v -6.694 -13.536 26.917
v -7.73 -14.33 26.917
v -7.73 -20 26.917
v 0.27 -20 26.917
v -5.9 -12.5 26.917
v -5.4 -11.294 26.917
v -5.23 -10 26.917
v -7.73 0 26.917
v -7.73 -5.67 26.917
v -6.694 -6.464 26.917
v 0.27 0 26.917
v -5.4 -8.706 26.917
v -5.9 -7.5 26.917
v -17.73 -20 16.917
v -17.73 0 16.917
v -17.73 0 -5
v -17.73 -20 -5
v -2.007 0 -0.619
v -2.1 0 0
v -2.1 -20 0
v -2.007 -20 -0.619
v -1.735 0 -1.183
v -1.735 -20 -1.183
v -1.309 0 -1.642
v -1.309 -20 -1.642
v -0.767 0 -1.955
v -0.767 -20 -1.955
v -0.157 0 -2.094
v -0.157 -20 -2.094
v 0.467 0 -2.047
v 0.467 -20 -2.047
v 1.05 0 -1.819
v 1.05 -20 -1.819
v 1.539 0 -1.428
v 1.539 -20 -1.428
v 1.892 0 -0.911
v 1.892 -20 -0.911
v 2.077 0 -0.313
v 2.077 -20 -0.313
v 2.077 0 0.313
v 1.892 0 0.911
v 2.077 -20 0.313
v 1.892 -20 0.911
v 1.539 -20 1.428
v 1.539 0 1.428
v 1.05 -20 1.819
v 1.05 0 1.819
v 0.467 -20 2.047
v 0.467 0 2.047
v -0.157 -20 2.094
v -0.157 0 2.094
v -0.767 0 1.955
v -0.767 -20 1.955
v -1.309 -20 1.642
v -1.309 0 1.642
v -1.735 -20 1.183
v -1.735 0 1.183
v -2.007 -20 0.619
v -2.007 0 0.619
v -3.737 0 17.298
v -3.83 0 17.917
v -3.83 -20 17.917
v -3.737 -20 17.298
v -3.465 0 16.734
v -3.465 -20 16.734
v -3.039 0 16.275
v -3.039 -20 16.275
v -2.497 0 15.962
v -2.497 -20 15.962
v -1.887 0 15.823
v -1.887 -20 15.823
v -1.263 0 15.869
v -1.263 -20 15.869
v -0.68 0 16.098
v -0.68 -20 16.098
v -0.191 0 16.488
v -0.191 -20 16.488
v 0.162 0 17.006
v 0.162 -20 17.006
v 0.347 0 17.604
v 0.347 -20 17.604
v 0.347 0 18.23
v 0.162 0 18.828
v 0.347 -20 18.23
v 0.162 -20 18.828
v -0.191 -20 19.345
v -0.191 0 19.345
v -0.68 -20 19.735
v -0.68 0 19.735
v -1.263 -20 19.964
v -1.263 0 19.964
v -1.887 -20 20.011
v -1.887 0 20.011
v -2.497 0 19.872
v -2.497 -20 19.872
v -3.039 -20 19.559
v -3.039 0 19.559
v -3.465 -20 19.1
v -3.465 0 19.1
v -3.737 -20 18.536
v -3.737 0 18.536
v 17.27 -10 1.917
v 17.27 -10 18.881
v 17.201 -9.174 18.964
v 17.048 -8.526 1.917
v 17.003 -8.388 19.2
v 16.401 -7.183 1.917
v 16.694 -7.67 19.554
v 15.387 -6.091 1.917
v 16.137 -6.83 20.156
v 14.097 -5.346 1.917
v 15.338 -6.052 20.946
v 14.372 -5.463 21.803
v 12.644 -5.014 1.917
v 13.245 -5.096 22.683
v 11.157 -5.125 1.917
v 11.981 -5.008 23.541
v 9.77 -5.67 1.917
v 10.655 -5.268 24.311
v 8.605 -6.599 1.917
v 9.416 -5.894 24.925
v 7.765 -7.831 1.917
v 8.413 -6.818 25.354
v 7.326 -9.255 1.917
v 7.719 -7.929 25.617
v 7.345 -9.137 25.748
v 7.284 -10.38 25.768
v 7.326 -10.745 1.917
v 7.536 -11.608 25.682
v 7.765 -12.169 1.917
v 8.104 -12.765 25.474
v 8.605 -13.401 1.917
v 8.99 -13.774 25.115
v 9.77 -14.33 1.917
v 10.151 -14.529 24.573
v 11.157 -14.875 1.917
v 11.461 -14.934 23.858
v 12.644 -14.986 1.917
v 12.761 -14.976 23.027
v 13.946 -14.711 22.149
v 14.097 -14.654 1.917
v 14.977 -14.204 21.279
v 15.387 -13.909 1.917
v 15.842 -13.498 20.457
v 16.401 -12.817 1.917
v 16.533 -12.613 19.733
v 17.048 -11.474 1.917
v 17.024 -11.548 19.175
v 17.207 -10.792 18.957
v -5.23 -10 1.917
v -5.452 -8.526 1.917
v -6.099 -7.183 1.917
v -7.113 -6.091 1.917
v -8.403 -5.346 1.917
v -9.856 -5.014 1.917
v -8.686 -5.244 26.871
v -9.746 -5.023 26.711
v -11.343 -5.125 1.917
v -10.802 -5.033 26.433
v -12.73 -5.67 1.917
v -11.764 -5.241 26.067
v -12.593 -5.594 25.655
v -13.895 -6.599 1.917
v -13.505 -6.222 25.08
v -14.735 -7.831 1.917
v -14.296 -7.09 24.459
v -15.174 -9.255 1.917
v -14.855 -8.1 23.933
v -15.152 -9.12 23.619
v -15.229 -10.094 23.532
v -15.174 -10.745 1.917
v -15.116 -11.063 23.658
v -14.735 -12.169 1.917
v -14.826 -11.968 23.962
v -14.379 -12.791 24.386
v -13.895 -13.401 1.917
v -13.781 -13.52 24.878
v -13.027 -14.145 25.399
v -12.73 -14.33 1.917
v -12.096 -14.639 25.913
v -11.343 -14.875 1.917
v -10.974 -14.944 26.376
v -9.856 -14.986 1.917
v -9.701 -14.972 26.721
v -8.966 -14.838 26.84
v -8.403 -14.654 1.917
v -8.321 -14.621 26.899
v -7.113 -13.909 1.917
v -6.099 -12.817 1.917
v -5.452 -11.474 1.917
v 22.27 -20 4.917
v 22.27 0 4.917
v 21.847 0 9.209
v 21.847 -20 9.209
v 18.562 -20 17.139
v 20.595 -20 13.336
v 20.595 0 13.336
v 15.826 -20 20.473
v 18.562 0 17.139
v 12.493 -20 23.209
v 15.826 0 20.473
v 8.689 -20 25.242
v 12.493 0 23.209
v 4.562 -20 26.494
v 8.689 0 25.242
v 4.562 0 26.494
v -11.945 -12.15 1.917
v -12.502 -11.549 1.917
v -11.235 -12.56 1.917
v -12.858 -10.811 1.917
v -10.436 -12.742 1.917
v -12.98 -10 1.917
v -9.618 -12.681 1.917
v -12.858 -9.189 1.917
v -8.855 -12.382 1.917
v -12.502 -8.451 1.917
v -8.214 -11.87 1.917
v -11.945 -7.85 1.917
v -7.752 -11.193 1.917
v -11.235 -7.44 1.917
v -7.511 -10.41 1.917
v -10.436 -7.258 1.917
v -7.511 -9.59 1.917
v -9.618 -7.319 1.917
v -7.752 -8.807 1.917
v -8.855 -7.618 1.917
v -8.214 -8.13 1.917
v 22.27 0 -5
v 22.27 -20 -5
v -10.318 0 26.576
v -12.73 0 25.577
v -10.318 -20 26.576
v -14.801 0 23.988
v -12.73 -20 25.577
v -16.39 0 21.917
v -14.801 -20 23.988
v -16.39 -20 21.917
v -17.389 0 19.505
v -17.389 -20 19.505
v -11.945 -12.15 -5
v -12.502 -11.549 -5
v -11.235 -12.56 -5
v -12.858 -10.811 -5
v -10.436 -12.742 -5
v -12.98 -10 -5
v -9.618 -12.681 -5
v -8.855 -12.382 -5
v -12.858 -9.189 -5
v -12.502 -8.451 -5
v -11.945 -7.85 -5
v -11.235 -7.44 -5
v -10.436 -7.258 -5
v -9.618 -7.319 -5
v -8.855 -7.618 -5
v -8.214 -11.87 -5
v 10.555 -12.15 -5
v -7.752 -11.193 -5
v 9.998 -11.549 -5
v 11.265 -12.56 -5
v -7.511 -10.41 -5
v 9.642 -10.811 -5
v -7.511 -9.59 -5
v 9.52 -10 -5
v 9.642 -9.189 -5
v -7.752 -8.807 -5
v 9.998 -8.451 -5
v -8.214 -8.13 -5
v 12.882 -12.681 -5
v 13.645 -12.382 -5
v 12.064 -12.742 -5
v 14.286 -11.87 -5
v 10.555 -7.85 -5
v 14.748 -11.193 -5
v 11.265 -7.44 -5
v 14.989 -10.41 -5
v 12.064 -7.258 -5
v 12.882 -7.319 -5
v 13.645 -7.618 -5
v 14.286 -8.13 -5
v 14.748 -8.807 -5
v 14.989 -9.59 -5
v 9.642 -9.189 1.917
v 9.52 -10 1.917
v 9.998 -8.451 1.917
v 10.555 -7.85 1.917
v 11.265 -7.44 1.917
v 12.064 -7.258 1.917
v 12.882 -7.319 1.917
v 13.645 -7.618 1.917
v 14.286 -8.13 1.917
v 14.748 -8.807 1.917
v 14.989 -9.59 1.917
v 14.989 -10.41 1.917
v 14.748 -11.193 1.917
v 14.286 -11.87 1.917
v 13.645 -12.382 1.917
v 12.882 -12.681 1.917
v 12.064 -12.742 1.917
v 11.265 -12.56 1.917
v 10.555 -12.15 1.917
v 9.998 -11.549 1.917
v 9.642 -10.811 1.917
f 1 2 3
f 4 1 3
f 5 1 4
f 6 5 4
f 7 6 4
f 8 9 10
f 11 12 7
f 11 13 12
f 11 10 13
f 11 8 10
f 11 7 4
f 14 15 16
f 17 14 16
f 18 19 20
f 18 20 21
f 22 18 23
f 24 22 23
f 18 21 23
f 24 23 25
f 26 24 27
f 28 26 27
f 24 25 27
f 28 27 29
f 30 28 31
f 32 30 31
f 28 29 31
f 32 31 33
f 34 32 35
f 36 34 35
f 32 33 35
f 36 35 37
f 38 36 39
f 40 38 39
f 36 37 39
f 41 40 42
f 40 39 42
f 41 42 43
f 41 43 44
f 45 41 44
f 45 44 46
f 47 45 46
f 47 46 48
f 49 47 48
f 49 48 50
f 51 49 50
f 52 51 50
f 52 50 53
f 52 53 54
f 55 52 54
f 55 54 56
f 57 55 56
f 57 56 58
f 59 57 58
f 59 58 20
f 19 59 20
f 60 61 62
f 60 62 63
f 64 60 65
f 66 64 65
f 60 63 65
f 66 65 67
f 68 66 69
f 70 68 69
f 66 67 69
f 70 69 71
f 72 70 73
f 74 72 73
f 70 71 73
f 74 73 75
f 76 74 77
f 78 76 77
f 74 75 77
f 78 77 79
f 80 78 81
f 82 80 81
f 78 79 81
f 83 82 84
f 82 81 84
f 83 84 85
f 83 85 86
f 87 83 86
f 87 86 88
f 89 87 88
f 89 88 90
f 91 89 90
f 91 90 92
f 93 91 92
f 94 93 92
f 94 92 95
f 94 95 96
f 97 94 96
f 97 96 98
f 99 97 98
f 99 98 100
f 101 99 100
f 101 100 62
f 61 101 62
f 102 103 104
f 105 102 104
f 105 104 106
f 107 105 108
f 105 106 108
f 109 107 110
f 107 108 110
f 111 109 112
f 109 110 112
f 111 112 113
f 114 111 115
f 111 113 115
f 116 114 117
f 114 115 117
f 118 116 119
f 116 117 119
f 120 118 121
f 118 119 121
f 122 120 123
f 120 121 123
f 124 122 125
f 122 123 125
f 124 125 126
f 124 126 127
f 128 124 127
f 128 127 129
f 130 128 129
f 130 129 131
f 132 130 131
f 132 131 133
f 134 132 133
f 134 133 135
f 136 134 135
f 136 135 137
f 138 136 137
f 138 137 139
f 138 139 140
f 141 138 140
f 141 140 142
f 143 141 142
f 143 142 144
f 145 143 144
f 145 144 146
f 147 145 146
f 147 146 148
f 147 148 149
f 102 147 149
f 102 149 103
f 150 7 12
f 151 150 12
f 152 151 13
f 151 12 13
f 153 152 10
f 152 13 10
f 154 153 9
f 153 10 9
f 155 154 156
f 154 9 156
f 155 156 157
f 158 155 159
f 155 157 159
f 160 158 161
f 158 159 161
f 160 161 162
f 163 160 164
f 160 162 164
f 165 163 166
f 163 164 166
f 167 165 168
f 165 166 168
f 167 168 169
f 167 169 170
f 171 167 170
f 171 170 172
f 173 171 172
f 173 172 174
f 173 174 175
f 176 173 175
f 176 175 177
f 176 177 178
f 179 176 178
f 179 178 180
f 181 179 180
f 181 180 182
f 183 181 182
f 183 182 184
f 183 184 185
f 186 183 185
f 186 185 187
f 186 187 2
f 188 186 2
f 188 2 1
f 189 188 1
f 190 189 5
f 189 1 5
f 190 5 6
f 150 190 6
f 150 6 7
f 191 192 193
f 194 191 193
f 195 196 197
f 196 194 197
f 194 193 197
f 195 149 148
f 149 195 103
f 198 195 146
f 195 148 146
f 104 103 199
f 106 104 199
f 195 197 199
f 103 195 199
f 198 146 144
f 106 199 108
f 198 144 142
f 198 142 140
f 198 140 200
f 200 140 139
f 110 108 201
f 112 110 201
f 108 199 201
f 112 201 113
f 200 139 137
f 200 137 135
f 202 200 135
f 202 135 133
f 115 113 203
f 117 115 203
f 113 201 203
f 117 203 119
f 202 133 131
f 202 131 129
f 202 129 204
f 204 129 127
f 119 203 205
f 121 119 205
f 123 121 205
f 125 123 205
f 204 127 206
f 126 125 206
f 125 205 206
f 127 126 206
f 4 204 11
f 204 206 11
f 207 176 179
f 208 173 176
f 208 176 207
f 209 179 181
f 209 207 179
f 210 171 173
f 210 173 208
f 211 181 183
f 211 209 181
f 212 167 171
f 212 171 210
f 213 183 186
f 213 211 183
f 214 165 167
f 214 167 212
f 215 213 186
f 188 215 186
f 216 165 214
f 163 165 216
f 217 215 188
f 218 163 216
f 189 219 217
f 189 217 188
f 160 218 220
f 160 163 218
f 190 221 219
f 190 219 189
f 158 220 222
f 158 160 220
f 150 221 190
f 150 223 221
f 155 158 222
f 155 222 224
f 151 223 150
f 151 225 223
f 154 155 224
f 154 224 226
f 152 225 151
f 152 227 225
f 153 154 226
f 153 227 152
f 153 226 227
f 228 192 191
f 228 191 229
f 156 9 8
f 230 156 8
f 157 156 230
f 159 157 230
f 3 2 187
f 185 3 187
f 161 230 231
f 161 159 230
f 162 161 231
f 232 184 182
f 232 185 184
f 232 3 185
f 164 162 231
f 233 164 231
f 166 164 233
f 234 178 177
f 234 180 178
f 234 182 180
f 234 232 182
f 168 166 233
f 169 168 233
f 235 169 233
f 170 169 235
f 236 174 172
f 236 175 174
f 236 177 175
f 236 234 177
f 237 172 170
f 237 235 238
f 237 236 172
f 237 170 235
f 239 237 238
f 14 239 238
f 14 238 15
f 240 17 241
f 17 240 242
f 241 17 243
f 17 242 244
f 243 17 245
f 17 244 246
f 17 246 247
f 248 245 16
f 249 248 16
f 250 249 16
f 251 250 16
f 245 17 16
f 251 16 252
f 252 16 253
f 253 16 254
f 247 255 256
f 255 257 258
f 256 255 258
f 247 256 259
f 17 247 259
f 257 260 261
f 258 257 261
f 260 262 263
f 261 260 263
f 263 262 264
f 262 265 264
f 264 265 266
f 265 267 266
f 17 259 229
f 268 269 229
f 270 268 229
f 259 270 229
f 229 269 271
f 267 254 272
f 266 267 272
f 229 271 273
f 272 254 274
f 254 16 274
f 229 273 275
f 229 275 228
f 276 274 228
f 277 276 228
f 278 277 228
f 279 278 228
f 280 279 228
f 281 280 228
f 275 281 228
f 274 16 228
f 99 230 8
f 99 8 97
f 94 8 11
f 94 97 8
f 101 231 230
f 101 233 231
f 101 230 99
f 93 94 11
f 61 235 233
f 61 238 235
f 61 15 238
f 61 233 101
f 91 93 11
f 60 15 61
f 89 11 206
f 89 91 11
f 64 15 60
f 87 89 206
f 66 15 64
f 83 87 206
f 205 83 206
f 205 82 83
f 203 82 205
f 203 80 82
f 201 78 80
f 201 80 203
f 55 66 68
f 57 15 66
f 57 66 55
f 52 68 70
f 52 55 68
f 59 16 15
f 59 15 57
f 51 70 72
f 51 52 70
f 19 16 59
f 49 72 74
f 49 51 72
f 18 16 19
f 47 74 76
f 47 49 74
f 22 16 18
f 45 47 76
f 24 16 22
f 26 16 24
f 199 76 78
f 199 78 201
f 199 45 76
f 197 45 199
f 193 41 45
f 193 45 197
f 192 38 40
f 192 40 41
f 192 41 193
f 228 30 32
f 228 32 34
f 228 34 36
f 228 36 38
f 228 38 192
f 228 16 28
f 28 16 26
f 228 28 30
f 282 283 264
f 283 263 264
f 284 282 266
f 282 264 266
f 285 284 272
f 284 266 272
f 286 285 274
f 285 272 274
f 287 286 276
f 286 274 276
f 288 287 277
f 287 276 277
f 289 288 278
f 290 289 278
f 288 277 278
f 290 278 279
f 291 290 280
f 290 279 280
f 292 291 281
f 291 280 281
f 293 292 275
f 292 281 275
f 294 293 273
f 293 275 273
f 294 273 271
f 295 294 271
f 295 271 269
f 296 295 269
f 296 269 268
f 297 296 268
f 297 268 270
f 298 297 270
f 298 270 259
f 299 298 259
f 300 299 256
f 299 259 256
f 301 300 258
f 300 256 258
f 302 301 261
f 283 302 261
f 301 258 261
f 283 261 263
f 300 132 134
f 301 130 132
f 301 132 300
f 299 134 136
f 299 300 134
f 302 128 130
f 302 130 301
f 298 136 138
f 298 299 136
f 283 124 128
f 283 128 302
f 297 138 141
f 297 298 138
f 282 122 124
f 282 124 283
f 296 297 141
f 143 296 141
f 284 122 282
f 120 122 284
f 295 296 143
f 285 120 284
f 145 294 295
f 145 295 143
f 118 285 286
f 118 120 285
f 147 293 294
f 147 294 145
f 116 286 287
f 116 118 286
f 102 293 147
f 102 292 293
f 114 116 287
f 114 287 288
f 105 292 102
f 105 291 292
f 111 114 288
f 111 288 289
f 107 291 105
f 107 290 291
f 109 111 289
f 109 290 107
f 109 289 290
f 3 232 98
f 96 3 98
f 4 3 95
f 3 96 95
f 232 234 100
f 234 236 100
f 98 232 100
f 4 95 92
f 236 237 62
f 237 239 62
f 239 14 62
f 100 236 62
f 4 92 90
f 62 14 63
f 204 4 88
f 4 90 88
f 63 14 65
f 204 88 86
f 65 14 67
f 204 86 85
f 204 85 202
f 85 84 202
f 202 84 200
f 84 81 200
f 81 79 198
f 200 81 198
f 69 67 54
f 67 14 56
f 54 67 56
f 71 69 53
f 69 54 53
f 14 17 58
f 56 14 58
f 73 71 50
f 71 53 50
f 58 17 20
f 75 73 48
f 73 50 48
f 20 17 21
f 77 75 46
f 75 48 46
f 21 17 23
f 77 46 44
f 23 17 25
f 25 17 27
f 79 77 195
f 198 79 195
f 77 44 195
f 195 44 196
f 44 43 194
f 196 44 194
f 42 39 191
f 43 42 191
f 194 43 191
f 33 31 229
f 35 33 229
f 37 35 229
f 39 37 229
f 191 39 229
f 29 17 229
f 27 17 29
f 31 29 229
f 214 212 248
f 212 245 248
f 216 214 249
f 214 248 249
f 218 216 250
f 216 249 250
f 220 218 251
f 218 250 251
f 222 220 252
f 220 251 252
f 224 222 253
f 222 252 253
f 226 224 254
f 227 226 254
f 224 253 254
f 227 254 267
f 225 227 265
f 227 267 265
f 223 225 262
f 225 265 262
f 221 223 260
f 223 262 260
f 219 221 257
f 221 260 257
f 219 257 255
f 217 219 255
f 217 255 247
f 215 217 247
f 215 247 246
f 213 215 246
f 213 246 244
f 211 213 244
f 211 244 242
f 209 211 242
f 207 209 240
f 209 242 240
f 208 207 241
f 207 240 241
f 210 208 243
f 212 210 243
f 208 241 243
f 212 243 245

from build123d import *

# Parameters (mm, degrees)
SKETCH2_W                      = 40
SKETCH2_H                      = 31.916671008
BOSS_EXTRUDE1_DEPTH            = 20
CBORE_FOR_M5_SHCS1_D           = 5.5
CBORE_FOR_M5_SHCS1_CBORE_D     = 10
CBORE_FOR_M5_SHCS1_CBORE_DEPTH = 25
M5X0_8_TAPPED_HOLE1_D          = 4.2
FILLET1_R                      = 22
FILLET2_START                  = -21
FILLET2_DEPTH                  = 22


with BuildPart() as part:
    # Sketch2 → Boss-Extrude1 (new body)
    with BuildSketch(Plane(origin=(0, 0, 0), x_dir=(1, 0, 0), z_dir=(0, 1, 0))):
        with Locations((2.27, -10.958335504)):
            Rectangle(SKETCH2_W, SKETCH2_H)
    extrude(amount=-BOSS_EXTRUDE1_DEPTH)

    # CBORE for M5 SHCS1 (through all)
    with Locations(Plane.XY.offset(26.916671008)):
        with Locations((-10.23, -10), (12.27, -10)):
            CounterBoreHole(CBORE_FOR_M5_SHCS1_D / 2, CBORE_FOR_M5_SHCS1_CBORE_D / 2, CBORE_FOR_M5_SHCS1_CBORE_DEPTH)

    # M5x0.8 Tapped Hole1 (through all)
    with Locations(Plane(origin=(0, 0, 0), x_dir=(1, 0, 0), z_dir=(0, 1, 0))):
        with Locations((-1.73, -17.916671008), (0, 0)):
            Hole(M5X0_8_TAPPED_HOLE1_D / 2)

    # Fillet1
    # the kernel refuses this fillet: 22 mm, written as the material it takes off along each edge
    with BuildSketch(Plane(origin=(22.27, 55, 26.916671008), x_dir=(0, 0, -1), z_dir=(0, -1, 0))) as fillet1_piece_1:
        with BuildLine():
            CenterArc((FILLET1_R, -FILLET1_R), FILLET1_R, 90, 90)
            Line((0, -FILLET1_R), (0, 0))
            Line((0, 0), (FILLET1_R, 0))
        make_face()
    extrude(amount=130, mode=Mode.SUBTRACT)

    # Fillet2: read off the stored shape, not the designer's step
    # Fillet2 outline → Fillet2 (cut)
    with BuildSketch(Plane(origin=(0, 0, 0), x_dir=(1, 0, 0), z_dir=(0, 1, 0)).offset(FILLET2_START)):
        with BuildLine():
            ThreePointArc((-7.73, -26.916671008), (-14.801067812, -23.98773882), (-17.73, -16.916671008))
            Line((-17.73, -16.916671008), (-17.73, -26.916671008))
            Line((-17.73, -26.916671008), (-7.73, -26.916671008))
        make_face()
    extrude(amount=FILLET2_DEPTH, mode=Mode.SUBTRACT)


solid = part.part
